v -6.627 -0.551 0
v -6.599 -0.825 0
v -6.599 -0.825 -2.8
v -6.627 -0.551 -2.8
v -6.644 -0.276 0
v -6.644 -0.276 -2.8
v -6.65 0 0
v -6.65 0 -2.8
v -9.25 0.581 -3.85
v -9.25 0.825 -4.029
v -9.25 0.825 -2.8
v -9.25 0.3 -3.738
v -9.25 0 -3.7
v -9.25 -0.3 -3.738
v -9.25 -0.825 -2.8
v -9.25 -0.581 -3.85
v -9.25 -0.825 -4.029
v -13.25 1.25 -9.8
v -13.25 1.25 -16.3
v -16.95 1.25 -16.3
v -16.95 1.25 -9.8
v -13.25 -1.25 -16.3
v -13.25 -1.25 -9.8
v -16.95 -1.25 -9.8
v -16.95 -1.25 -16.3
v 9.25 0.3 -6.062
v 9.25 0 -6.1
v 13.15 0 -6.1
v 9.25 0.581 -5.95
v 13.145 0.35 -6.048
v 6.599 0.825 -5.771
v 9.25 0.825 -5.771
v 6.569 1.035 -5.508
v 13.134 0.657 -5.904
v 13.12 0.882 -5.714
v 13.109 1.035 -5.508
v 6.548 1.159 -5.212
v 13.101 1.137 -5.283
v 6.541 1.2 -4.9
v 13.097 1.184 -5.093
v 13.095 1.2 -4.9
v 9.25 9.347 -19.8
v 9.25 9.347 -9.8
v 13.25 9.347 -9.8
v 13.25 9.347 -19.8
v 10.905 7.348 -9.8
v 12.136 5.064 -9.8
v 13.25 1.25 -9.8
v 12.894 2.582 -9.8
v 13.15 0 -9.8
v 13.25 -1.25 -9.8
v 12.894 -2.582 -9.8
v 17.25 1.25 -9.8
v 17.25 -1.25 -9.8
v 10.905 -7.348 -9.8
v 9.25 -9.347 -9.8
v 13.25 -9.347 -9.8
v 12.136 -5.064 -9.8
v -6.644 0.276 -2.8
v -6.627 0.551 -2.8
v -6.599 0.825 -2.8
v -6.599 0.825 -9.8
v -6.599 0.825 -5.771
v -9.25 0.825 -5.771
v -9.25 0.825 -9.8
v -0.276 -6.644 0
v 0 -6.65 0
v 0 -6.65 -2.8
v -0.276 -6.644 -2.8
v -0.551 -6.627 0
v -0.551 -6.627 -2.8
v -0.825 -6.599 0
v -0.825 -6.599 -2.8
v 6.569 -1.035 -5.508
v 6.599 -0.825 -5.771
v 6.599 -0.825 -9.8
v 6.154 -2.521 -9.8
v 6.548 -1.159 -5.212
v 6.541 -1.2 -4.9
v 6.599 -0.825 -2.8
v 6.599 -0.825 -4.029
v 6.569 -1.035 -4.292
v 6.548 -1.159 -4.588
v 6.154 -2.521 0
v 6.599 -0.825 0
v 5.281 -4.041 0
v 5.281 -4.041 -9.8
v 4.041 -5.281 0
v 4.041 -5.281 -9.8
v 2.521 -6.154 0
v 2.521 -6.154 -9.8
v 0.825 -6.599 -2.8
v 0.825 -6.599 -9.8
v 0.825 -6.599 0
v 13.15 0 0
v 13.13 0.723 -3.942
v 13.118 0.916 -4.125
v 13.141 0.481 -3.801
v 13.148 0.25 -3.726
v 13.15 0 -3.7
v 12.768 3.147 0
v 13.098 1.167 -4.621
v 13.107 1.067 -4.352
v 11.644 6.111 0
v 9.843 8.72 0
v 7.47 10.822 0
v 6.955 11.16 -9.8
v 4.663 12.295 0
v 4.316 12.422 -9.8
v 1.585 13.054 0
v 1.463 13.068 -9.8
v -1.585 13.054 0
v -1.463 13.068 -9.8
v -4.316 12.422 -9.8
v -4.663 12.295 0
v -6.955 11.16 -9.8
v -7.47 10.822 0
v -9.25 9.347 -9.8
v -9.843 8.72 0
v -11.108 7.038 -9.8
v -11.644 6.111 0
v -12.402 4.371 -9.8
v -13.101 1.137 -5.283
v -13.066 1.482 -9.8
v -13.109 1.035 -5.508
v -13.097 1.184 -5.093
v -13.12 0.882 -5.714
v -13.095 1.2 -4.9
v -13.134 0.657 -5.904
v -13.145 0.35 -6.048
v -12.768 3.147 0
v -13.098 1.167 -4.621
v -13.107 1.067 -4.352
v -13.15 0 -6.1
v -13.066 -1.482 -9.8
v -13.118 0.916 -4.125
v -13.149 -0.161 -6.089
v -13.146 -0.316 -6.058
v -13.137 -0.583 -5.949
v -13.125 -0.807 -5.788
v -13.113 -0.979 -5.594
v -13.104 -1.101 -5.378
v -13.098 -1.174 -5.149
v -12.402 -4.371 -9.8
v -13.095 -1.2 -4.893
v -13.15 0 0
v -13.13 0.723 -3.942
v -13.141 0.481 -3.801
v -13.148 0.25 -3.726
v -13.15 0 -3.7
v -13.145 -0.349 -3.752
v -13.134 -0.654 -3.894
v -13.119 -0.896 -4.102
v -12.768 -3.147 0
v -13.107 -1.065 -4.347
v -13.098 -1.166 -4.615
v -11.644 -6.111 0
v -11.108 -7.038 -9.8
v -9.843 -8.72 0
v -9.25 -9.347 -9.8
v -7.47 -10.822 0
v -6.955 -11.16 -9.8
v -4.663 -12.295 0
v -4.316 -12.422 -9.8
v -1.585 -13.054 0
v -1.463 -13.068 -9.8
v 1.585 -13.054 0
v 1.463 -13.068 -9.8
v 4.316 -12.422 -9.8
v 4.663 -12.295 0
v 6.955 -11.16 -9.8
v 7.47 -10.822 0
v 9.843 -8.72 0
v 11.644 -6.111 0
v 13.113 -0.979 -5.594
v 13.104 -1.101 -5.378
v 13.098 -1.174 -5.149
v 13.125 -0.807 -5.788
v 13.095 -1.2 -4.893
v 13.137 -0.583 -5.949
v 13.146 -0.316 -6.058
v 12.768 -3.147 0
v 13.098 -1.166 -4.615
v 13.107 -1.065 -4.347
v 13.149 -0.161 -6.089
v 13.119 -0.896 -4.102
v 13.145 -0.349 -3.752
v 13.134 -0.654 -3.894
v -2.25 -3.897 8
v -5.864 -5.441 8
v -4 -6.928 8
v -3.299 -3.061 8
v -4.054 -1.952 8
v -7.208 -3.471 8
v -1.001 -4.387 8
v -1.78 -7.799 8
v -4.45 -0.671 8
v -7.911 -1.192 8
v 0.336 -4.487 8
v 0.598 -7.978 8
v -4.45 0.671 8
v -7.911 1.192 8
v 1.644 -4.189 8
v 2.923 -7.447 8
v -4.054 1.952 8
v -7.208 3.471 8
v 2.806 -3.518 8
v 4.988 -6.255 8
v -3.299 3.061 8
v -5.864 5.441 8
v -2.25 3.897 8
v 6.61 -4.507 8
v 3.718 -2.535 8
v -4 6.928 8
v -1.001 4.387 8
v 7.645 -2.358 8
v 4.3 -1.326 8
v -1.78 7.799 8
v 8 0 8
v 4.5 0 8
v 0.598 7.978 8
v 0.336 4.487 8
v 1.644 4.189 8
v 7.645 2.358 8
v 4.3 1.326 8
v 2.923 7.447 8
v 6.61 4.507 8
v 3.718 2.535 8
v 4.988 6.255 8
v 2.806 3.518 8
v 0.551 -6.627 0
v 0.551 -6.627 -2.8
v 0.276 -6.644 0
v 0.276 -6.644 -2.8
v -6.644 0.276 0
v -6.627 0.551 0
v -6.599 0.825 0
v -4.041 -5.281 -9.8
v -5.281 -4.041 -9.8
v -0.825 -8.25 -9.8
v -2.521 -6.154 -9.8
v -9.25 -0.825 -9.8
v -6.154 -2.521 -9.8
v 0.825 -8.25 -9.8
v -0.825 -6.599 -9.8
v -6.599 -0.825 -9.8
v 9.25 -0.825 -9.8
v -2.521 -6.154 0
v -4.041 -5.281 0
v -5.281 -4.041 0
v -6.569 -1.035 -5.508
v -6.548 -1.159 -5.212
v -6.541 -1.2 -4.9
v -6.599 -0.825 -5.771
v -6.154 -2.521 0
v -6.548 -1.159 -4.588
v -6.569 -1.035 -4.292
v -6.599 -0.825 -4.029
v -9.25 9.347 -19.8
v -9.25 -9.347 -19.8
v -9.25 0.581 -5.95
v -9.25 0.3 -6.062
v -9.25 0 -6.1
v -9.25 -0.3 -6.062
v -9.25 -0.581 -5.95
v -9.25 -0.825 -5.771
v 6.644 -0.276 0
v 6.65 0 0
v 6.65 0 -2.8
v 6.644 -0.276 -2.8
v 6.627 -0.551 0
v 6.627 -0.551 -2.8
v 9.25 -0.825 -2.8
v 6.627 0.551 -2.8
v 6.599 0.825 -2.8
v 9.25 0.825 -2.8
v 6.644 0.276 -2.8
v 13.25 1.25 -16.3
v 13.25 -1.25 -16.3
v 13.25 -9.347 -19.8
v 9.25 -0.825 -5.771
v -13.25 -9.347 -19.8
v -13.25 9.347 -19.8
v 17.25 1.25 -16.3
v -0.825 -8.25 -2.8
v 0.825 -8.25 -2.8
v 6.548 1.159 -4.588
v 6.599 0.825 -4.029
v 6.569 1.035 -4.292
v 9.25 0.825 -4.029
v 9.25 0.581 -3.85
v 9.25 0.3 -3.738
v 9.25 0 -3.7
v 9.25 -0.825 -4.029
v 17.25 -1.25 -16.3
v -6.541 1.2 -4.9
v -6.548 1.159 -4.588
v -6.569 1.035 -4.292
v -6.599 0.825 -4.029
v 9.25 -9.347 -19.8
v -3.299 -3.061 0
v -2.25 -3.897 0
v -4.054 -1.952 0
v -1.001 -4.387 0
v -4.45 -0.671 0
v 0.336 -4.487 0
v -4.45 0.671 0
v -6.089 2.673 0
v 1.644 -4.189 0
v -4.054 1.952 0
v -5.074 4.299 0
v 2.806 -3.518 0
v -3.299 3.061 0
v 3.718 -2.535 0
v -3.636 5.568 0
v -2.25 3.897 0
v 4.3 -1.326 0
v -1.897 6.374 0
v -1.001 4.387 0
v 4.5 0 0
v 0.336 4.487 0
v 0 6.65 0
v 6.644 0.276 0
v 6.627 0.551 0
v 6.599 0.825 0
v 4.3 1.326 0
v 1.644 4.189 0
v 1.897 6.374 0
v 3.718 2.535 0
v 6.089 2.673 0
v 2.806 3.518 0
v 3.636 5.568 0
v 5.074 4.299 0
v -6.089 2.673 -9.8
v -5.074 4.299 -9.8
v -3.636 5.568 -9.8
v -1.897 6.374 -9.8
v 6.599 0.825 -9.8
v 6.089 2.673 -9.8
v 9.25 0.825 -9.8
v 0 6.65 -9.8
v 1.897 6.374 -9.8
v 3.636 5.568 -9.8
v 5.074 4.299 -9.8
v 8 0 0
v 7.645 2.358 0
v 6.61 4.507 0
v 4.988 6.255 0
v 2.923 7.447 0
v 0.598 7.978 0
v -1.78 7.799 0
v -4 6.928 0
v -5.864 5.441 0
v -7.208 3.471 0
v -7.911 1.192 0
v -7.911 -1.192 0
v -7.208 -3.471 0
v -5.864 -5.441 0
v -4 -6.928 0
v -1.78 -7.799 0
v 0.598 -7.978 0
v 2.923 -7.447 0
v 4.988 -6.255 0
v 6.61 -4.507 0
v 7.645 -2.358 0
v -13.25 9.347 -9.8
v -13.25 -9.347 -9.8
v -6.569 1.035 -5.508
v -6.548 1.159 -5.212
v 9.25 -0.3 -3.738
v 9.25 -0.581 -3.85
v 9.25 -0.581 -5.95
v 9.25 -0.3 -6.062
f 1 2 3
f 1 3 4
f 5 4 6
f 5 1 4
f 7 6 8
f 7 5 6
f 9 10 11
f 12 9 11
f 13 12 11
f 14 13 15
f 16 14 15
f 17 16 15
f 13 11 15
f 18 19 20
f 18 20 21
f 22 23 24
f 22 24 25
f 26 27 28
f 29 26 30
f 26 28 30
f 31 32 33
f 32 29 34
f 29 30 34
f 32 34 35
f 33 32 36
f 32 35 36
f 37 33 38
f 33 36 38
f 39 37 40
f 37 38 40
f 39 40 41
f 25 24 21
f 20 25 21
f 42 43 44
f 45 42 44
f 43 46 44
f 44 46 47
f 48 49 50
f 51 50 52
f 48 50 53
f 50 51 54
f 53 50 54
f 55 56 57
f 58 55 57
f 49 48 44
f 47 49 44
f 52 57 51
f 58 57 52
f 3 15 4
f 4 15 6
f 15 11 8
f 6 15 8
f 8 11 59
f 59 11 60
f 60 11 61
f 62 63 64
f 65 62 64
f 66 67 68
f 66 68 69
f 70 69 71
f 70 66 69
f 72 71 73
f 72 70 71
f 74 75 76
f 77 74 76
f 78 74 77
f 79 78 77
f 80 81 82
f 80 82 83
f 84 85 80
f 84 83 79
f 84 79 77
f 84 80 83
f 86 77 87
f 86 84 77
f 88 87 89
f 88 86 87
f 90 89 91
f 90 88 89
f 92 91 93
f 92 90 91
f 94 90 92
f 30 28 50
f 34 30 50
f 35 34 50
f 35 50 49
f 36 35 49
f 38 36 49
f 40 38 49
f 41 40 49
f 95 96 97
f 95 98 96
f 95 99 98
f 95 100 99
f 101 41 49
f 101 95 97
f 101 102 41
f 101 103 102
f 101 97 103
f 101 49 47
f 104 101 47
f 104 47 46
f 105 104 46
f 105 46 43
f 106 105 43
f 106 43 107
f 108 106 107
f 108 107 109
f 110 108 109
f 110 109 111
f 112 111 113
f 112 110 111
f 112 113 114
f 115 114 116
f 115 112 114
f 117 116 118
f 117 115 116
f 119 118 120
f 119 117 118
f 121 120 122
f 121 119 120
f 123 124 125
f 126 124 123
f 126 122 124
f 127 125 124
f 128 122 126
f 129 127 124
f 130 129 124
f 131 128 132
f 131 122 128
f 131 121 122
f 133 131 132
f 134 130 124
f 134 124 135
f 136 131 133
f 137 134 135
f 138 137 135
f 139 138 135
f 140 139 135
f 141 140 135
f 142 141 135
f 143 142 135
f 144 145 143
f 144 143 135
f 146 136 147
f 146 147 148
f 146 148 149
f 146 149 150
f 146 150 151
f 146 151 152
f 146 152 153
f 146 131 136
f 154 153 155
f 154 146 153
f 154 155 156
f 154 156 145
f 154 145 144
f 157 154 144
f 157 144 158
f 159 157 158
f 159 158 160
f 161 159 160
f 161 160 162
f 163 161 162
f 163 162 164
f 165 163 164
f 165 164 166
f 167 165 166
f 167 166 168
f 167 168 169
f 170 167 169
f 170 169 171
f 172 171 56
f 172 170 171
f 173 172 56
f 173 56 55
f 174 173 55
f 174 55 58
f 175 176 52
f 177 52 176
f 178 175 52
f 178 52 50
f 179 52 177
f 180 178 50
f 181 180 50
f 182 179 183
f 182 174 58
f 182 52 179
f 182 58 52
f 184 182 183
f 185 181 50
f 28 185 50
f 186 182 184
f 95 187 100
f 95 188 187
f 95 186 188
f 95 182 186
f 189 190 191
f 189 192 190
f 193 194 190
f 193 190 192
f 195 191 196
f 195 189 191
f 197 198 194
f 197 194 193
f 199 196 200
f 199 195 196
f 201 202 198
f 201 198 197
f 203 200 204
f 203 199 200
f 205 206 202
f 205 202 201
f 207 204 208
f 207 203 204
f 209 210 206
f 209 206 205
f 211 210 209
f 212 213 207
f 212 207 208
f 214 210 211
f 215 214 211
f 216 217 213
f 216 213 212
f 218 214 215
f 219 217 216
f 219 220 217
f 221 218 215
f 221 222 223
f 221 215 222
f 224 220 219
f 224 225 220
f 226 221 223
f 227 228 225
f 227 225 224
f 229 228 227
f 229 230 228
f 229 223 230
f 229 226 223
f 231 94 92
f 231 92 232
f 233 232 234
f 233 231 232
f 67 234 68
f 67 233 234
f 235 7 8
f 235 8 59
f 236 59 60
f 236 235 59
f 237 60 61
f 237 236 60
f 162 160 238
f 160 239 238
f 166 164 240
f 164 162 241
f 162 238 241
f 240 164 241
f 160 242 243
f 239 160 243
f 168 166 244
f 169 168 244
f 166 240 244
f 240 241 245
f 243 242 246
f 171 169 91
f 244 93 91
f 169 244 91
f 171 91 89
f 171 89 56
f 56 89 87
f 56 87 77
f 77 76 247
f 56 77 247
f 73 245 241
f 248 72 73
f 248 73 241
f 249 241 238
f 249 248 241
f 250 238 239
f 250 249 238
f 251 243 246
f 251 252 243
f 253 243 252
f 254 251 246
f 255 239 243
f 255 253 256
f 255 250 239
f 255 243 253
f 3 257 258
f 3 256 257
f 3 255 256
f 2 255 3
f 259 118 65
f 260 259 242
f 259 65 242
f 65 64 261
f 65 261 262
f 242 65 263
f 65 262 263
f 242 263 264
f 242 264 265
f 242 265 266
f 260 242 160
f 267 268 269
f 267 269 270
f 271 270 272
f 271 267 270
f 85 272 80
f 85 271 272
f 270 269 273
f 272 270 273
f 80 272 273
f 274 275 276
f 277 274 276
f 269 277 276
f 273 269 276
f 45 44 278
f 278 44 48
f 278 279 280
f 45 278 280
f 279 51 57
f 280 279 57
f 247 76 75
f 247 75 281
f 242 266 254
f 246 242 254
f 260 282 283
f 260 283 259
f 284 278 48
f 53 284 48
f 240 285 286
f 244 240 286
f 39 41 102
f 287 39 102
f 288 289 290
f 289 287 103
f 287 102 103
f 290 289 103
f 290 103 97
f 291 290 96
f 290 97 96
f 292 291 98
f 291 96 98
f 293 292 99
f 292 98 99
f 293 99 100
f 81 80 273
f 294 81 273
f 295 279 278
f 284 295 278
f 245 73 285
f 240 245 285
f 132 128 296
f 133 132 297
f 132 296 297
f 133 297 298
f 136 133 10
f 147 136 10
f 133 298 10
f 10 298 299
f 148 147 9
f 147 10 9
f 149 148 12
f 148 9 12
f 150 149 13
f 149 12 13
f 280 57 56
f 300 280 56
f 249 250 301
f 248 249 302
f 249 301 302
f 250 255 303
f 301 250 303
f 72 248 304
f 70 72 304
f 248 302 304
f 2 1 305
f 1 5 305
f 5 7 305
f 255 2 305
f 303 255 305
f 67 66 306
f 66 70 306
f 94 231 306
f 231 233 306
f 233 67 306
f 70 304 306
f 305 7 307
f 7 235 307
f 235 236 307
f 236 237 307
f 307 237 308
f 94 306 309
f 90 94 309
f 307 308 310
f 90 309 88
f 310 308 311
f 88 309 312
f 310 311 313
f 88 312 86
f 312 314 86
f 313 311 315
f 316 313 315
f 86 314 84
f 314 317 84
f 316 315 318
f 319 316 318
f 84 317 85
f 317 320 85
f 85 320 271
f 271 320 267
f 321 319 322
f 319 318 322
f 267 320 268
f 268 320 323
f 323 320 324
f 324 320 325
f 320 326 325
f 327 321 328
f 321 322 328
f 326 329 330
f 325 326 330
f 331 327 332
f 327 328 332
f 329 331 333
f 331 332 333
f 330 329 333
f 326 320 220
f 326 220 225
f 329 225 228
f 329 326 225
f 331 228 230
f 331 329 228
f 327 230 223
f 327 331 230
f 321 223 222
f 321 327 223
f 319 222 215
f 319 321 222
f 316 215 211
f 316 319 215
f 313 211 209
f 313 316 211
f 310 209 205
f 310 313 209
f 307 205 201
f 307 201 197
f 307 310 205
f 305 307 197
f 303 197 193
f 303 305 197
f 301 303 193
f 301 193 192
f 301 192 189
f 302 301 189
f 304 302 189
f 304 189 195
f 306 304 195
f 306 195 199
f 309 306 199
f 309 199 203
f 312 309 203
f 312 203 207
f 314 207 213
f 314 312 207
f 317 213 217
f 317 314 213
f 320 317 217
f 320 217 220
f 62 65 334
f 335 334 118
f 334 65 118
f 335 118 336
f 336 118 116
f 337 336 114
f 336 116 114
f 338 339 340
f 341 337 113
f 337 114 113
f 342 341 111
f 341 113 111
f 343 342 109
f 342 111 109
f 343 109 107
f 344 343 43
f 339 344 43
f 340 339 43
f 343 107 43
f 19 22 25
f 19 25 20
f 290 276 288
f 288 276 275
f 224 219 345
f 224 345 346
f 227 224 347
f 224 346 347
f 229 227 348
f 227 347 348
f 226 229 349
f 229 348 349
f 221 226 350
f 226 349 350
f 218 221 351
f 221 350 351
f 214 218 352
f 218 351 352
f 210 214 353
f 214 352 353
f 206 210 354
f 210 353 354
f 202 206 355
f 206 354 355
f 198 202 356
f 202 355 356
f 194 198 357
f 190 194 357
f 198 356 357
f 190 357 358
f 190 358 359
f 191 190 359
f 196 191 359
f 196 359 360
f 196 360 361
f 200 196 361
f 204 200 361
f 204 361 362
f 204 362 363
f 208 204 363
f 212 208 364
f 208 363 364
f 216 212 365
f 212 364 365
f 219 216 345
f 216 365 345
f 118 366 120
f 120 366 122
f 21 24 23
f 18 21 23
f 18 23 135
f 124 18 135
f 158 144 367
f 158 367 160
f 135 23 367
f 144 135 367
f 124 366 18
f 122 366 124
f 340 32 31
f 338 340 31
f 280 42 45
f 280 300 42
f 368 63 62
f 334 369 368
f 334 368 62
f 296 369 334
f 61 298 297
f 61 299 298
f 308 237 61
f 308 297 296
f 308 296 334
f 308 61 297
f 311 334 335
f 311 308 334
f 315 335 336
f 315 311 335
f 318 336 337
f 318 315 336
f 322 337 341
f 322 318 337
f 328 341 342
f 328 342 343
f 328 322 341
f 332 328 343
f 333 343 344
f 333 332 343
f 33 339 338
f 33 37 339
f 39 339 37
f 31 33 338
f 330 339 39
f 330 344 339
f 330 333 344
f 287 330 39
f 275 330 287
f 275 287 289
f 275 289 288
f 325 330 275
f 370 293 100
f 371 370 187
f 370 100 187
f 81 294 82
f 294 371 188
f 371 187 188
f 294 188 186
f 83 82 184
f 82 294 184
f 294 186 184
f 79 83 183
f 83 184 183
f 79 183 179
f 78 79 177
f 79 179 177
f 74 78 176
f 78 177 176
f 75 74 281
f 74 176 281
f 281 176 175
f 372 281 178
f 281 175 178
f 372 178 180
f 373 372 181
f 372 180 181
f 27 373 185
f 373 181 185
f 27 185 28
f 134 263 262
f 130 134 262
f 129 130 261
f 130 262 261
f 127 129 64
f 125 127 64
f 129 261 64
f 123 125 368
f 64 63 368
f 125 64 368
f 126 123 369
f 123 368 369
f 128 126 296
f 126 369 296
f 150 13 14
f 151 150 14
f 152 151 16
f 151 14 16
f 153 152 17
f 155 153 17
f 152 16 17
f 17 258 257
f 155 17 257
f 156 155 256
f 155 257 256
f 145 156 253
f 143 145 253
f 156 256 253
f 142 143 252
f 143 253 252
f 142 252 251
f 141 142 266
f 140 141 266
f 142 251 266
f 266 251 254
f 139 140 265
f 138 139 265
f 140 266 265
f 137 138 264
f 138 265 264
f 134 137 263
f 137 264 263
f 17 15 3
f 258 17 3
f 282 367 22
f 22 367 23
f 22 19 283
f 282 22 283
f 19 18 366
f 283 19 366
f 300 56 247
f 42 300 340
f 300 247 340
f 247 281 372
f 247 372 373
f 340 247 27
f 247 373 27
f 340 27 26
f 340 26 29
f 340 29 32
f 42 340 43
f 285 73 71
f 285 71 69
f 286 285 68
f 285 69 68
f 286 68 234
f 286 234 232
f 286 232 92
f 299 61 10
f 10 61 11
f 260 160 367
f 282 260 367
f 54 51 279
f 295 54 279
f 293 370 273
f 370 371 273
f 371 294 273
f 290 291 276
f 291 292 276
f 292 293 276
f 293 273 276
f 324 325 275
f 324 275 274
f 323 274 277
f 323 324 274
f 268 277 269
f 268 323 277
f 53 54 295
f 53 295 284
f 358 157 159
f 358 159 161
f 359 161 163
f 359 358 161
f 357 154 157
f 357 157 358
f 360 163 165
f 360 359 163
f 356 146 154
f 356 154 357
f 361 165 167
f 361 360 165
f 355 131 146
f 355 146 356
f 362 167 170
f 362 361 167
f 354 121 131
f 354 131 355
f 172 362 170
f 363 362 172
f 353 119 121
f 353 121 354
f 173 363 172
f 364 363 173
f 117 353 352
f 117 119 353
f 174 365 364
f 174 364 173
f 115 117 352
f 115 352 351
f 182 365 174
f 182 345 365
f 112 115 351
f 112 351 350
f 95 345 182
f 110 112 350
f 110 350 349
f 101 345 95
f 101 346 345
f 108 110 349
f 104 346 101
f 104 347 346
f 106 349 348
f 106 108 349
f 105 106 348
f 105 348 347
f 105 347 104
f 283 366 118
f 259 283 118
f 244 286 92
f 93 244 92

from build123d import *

# Parameters (mm, degrees)
F0_R      = 8
F0_R_2    = 4.5
F1_DEPTH  = 8
F2_R      = 13.15
F3_DEPTH  = 9.8
F4_START  = -2.8
F4_DEPTH  = 22.2
F6_DEPTH  = 10
F8_START  = -26.2
F8_DEPTH  = 4
F9_DEPTH  = 4
F10_DEPTH = 76


with BuildPart() as f1:
    # F0 (on Top) → F1 (new body)
    with BuildSketch(Plane.XY):
        Circle(F0_R)
        Circle(F0_R_2, mode=Mode.SUBTRACT)
    extrude(amount=F1_DEPTH)

    # F2 (on Top) → F3 (join)
    with BuildSketch(Plane.XY):
        Circle(F2_R)
        with BuildLine():
            ThreePointArc((-6.5986267511, 0.825), (0, 6.65), (6.5986267511, 0.825))
            Line((6.5986267511, 0.825), (6.65, 0.825))
            Line((6.65, 0.825), (9.25, 0.825))
            Line((9.25, 0.825), (9.25, -0.825))
            Line((9.25, -0.825), (6.65, -0.825))
            Line((6.65, -0.825), (6.5986267511, -0.825))
            ThreePointArc((6.5986267511, -0.825), (4.7022600949, -4.7022600949), (0.825, -6.5986267511))
            Line((0.825, -6.5986267511), (0.825, -6.65))
            Line((0.825, -6.65), (0.825, -8.25))
            Line((0.825, -8.25), (-0.825, -8.25))
            Line((-0.825, -8.25), (-0.825, -6.65))
            Line((-0.825, -6.65), (-0.825, -6.5986267511))
            ThreePointArc((-0.825, -6.5986267511), (-4.7022600949, -4.7022600949), (-6.5986267511, -0.825))
            Line((-6.5986267511, -0.825), (-6.65, -0.825))
            Line((-6.65, -0.825), (-9.25, -0.825))
            Line((-9.25, -0.825), (-9.25, 0.825))
            Line((-9.25, 0.825), (-6.65, 0.825))
            Line((-6.65, 0.825), (-6.5986267511, 0.825))
        make_face(mode=Mode.SUBTRACT)
        Polygon((-6.65, -0.825), (-6.65, 0), (-6.65, 0.825), (-9.25, 0.825), (-9.25, -0.825), align=None)
        Polygon((6.65, 0.825), (6.65, 0), (6.65, -0.825), (9.25, -0.825), (9.25, 0.825), align=None)
        Polygon((0.825, -6.65), (0, -6.65), (-0.825, -6.65), (-0.825, -8.25), (0.825, -8.25), align=None)
        with BuildLine():
            Line((0.825, -6.65), (0.825, -6.5986267511))
            ThreePointArc((0.825, -6.5986267511), (0.413298987, -6.6371442615), (0, -6.65))
            Line((0, -6.65), (0.825, -6.65))
        make_face()
        with BuildLine():
            Line((-0.825, -6.65), (0, -6.65))
            ThreePointArc((0, -6.65), (-0.413298987, -6.6371442615), (-0.825, -6.5986267511))
            Line((-0.825, -6.5986267511), (-0.825, -6.65))
        make_face()
        with BuildLine():
            ThreePointArc((6.5986267511, 0.825), (6.6371442615, 0.413298987), (6.65, 0))
            Line((6.65, 0), (6.65, 0.825))
            Line((6.65, 0.825), (6.5986267511, 0.825))
        make_face()
        with BuildLine():
            Line((6.65, -0.825), (6.65, 0))
            ThreePointArc((6.65, 0), (6.6371442615, -0.413298987), (6.5986267511, -0.825))
            Line((6.5986267511, -0.825), (6.65, -0.825))
        make_face()
        with BuildLine():
            ThreePointArc((-6.5986267511, -0.825), (-6.6371442615, -0.413298987), (-6.65, 0))
            Line((-6.65, 0), (-6.65, -0.825))
            Line((-6.65, -0.825), (-6.5986267511, -0.825))
        make_face()
        with BuildLine():
            ThreePointArc((-6.65, 0), (-6.6371442615, 0.413298987), (-6.5986267511, 0.825))
            Line((-6.5986267511, 0.825), (-6.65, 0.825))
            Line((-6.65, 0.825), (-6.65, 0))
        make_face()
    extrude(amount=-F3_DEPTH)

    # F2 (on Top) → F4 (cut)
    with BuildSketch(Plane.XY.offset(F4_START)):
        Polygon((6.65, 0.825), (6.65, 0), (6.65, -0.825), (9.25, -0.825), (9.25, 0.825), align=None)
        Polygon((0.825, -6.65), (0, -6.65), (-0.825, -6.65), (-0.825, -8.25), (0.825, -8.25), align=None)
        Polygon((-6.65, -0.825), (-6.65, 0), (-6.65, 0.825), (-9.25, 0.825), (-9.25, -0.825), align=None)
        with BuildLine():
            Line((6.65, -0.825), (6.65, 0))
            ThreePointArc((6.65, 0), (6.6371442615, -0.413298987), (6.5986267511, -0.825))
            Line((6.5986267511, -0.825), (6.65, -0.825))
        make_face()
        with BuildLine():
            ThreePointArc((6.5986267511, 0.825), (6.6371442615, 0.413298987), (6.65, 0))
            Line((6.65, 0), (6.65, 0.825))
            Line((6.65, 0.825), (6.5986267511, 0.825))
        make_face()
        with BuildLine():
            Line((-0.825, -6.65), (0, -6.65))
            ThreePointArc((0, -6.65), (-0.413298987, -6.6371442615), (-0.825, -6.5986267511))
            Line((-0.825, -6.5986267511), (-0.825, -6.65))
        make_face()
        with BuildLine():
            Line((0.825, -6.65), (0.825, -6.5986267511))
            ThreePointArc((0.825, -6.5986267511), (0.413298987, -6.6371442615), (0, -6.65))
            Line((0, -6.65), (0.825, -6.65))
        make_face()
        with BuildLine():
            ThreePointArc((-6.65, 0), (-6.6371442615, 0.413298987), (-6.5986267511, 0.825))
            Line((-6.5986267511, 0.825), (-6.65, 0.825))
            Line((-6.65, 0.825), (-6.65, 0))
        make_face()
        with BuildLine():
            ThreePointArc((-6.5986267511, -0.825), (-6.6371442615, -0.413298987), (-6.65, 0))
            Line((-6.65, 0), (-6.65, -0.825))
            Line((-6.65, -0.825), (-6.5986267511, -0.825))
        make_face()
    extrude(amount=-F4_DEPTH, mode=Mode.SUBTRACT)

    # F5 (on face) → F6 (join)
    with BuildSketch(Plane(origin=(0, 0, -9.8), x_dir=(1, 0, 0), z_dir=(0, 0, -1))):
        with BuildLine():
            ThreePointArc((13.15, 0), (12.135897165, -5.0638424146), (9.25, -9.3466571564))
            Line((9.25, -9.3466571564), (13.25, -9.3466571564))
            Line((13.25, -9.3466571564), (13.25, 9.3466571564))
            Line((13.25, 9.3466571564), (9.25, 9.3466571564))
            ThreePointArc((9.25, 9.3466571564), (12.135897165, 5.0638424146), (13.15, 0))
        make_face()
        with BuildLine():
            Line((9.25, -0.825), (9.25, -9.3466571564))
            ThreePointArc((9.25, -9.3466571564), (12.135897165, -5.0638424146), (13.15, 0))
            ThreePointArc((13.15, 0), (12.135897165, 5.0638424146), (9.25, 9.3466571564))
            Line((9.25, 9.3466571564), (9.25, 0.825))
            Line((9.25, 0.825), (9.25, -0.825))
        make_face()
        with BuildLine():
            ThreePointArc((-9.25, 9.3466571564), (-13.15, 0), (-9.25, -9.3466571564))
            Line((-9.25, -9.3466571564), (-9.25, -0.825))
            Line((-9.25, -0.825), (-9.25, 0.825))
            Line((-9.25, 0.825), (-9.25, 9.3466571564))
        make_face()
        with BuildLine():
            Line((-13.25, -9.3466571564), (-9.25, -9.3466571564))
            ThreePointArc((-9.25, -9.3466571564), (-13.15, 0), (-9.25, 9.3466571564))
            Line((-9.25, 9.3466571564), (-13.25, 9.3466571564))
            Line((-13.25, 9.3466571564), (-13.25, -9.3466571564))
        make_face()
    extrude(amount=F6_DEPTH)

    # F7 (on face) → F8 (join)
    with BuildSketch(Plane.YZ.offset(13.25).offset(F8_START)):
        Polygon((0, -9.8), (-1.25, -9.8), (-1.25, -16.3), (1.25, -16.3), (1.25, -9.8), align=None)
    extrude(amount=-F8_DEPTH)

    # F7 (on face) → F9 (join)
    with BuildSketch(Plane.YZ.offset(13.25)):
        Polygon((0, -9.8), (-1.25, -9.8), (-1.25, -16.3), (1.25, -16.3), (1.25, -9.8), align=None)
    extrude(amount=F9_DEPTH)

    # F7 (on face) → F10 (cut)
    with BuildSketch(Plane.YZ.offset(13.25)):
        with BuildLine():
            ThreePointArc((0, -3.7), (-1.2, -4.9), (0, -6.1))
            Line((0, -6.1), (0, -3.7))
        make_face()
        with BuildLine():
            Line((0, -3.7), (0, -6.1))
            ThreePointArc((0, -6.1), (0.8485281374, -5.7485281374), (1.2, -4.9))
            ThreePointArc((1.2, -4.9), (0.8485281374, -4.0514718626), (0, -3.7))
        make_face()
    extrude(amount=-F10_DEPTH, mode=Mode.SUBTRACT)


solid = f1.part
